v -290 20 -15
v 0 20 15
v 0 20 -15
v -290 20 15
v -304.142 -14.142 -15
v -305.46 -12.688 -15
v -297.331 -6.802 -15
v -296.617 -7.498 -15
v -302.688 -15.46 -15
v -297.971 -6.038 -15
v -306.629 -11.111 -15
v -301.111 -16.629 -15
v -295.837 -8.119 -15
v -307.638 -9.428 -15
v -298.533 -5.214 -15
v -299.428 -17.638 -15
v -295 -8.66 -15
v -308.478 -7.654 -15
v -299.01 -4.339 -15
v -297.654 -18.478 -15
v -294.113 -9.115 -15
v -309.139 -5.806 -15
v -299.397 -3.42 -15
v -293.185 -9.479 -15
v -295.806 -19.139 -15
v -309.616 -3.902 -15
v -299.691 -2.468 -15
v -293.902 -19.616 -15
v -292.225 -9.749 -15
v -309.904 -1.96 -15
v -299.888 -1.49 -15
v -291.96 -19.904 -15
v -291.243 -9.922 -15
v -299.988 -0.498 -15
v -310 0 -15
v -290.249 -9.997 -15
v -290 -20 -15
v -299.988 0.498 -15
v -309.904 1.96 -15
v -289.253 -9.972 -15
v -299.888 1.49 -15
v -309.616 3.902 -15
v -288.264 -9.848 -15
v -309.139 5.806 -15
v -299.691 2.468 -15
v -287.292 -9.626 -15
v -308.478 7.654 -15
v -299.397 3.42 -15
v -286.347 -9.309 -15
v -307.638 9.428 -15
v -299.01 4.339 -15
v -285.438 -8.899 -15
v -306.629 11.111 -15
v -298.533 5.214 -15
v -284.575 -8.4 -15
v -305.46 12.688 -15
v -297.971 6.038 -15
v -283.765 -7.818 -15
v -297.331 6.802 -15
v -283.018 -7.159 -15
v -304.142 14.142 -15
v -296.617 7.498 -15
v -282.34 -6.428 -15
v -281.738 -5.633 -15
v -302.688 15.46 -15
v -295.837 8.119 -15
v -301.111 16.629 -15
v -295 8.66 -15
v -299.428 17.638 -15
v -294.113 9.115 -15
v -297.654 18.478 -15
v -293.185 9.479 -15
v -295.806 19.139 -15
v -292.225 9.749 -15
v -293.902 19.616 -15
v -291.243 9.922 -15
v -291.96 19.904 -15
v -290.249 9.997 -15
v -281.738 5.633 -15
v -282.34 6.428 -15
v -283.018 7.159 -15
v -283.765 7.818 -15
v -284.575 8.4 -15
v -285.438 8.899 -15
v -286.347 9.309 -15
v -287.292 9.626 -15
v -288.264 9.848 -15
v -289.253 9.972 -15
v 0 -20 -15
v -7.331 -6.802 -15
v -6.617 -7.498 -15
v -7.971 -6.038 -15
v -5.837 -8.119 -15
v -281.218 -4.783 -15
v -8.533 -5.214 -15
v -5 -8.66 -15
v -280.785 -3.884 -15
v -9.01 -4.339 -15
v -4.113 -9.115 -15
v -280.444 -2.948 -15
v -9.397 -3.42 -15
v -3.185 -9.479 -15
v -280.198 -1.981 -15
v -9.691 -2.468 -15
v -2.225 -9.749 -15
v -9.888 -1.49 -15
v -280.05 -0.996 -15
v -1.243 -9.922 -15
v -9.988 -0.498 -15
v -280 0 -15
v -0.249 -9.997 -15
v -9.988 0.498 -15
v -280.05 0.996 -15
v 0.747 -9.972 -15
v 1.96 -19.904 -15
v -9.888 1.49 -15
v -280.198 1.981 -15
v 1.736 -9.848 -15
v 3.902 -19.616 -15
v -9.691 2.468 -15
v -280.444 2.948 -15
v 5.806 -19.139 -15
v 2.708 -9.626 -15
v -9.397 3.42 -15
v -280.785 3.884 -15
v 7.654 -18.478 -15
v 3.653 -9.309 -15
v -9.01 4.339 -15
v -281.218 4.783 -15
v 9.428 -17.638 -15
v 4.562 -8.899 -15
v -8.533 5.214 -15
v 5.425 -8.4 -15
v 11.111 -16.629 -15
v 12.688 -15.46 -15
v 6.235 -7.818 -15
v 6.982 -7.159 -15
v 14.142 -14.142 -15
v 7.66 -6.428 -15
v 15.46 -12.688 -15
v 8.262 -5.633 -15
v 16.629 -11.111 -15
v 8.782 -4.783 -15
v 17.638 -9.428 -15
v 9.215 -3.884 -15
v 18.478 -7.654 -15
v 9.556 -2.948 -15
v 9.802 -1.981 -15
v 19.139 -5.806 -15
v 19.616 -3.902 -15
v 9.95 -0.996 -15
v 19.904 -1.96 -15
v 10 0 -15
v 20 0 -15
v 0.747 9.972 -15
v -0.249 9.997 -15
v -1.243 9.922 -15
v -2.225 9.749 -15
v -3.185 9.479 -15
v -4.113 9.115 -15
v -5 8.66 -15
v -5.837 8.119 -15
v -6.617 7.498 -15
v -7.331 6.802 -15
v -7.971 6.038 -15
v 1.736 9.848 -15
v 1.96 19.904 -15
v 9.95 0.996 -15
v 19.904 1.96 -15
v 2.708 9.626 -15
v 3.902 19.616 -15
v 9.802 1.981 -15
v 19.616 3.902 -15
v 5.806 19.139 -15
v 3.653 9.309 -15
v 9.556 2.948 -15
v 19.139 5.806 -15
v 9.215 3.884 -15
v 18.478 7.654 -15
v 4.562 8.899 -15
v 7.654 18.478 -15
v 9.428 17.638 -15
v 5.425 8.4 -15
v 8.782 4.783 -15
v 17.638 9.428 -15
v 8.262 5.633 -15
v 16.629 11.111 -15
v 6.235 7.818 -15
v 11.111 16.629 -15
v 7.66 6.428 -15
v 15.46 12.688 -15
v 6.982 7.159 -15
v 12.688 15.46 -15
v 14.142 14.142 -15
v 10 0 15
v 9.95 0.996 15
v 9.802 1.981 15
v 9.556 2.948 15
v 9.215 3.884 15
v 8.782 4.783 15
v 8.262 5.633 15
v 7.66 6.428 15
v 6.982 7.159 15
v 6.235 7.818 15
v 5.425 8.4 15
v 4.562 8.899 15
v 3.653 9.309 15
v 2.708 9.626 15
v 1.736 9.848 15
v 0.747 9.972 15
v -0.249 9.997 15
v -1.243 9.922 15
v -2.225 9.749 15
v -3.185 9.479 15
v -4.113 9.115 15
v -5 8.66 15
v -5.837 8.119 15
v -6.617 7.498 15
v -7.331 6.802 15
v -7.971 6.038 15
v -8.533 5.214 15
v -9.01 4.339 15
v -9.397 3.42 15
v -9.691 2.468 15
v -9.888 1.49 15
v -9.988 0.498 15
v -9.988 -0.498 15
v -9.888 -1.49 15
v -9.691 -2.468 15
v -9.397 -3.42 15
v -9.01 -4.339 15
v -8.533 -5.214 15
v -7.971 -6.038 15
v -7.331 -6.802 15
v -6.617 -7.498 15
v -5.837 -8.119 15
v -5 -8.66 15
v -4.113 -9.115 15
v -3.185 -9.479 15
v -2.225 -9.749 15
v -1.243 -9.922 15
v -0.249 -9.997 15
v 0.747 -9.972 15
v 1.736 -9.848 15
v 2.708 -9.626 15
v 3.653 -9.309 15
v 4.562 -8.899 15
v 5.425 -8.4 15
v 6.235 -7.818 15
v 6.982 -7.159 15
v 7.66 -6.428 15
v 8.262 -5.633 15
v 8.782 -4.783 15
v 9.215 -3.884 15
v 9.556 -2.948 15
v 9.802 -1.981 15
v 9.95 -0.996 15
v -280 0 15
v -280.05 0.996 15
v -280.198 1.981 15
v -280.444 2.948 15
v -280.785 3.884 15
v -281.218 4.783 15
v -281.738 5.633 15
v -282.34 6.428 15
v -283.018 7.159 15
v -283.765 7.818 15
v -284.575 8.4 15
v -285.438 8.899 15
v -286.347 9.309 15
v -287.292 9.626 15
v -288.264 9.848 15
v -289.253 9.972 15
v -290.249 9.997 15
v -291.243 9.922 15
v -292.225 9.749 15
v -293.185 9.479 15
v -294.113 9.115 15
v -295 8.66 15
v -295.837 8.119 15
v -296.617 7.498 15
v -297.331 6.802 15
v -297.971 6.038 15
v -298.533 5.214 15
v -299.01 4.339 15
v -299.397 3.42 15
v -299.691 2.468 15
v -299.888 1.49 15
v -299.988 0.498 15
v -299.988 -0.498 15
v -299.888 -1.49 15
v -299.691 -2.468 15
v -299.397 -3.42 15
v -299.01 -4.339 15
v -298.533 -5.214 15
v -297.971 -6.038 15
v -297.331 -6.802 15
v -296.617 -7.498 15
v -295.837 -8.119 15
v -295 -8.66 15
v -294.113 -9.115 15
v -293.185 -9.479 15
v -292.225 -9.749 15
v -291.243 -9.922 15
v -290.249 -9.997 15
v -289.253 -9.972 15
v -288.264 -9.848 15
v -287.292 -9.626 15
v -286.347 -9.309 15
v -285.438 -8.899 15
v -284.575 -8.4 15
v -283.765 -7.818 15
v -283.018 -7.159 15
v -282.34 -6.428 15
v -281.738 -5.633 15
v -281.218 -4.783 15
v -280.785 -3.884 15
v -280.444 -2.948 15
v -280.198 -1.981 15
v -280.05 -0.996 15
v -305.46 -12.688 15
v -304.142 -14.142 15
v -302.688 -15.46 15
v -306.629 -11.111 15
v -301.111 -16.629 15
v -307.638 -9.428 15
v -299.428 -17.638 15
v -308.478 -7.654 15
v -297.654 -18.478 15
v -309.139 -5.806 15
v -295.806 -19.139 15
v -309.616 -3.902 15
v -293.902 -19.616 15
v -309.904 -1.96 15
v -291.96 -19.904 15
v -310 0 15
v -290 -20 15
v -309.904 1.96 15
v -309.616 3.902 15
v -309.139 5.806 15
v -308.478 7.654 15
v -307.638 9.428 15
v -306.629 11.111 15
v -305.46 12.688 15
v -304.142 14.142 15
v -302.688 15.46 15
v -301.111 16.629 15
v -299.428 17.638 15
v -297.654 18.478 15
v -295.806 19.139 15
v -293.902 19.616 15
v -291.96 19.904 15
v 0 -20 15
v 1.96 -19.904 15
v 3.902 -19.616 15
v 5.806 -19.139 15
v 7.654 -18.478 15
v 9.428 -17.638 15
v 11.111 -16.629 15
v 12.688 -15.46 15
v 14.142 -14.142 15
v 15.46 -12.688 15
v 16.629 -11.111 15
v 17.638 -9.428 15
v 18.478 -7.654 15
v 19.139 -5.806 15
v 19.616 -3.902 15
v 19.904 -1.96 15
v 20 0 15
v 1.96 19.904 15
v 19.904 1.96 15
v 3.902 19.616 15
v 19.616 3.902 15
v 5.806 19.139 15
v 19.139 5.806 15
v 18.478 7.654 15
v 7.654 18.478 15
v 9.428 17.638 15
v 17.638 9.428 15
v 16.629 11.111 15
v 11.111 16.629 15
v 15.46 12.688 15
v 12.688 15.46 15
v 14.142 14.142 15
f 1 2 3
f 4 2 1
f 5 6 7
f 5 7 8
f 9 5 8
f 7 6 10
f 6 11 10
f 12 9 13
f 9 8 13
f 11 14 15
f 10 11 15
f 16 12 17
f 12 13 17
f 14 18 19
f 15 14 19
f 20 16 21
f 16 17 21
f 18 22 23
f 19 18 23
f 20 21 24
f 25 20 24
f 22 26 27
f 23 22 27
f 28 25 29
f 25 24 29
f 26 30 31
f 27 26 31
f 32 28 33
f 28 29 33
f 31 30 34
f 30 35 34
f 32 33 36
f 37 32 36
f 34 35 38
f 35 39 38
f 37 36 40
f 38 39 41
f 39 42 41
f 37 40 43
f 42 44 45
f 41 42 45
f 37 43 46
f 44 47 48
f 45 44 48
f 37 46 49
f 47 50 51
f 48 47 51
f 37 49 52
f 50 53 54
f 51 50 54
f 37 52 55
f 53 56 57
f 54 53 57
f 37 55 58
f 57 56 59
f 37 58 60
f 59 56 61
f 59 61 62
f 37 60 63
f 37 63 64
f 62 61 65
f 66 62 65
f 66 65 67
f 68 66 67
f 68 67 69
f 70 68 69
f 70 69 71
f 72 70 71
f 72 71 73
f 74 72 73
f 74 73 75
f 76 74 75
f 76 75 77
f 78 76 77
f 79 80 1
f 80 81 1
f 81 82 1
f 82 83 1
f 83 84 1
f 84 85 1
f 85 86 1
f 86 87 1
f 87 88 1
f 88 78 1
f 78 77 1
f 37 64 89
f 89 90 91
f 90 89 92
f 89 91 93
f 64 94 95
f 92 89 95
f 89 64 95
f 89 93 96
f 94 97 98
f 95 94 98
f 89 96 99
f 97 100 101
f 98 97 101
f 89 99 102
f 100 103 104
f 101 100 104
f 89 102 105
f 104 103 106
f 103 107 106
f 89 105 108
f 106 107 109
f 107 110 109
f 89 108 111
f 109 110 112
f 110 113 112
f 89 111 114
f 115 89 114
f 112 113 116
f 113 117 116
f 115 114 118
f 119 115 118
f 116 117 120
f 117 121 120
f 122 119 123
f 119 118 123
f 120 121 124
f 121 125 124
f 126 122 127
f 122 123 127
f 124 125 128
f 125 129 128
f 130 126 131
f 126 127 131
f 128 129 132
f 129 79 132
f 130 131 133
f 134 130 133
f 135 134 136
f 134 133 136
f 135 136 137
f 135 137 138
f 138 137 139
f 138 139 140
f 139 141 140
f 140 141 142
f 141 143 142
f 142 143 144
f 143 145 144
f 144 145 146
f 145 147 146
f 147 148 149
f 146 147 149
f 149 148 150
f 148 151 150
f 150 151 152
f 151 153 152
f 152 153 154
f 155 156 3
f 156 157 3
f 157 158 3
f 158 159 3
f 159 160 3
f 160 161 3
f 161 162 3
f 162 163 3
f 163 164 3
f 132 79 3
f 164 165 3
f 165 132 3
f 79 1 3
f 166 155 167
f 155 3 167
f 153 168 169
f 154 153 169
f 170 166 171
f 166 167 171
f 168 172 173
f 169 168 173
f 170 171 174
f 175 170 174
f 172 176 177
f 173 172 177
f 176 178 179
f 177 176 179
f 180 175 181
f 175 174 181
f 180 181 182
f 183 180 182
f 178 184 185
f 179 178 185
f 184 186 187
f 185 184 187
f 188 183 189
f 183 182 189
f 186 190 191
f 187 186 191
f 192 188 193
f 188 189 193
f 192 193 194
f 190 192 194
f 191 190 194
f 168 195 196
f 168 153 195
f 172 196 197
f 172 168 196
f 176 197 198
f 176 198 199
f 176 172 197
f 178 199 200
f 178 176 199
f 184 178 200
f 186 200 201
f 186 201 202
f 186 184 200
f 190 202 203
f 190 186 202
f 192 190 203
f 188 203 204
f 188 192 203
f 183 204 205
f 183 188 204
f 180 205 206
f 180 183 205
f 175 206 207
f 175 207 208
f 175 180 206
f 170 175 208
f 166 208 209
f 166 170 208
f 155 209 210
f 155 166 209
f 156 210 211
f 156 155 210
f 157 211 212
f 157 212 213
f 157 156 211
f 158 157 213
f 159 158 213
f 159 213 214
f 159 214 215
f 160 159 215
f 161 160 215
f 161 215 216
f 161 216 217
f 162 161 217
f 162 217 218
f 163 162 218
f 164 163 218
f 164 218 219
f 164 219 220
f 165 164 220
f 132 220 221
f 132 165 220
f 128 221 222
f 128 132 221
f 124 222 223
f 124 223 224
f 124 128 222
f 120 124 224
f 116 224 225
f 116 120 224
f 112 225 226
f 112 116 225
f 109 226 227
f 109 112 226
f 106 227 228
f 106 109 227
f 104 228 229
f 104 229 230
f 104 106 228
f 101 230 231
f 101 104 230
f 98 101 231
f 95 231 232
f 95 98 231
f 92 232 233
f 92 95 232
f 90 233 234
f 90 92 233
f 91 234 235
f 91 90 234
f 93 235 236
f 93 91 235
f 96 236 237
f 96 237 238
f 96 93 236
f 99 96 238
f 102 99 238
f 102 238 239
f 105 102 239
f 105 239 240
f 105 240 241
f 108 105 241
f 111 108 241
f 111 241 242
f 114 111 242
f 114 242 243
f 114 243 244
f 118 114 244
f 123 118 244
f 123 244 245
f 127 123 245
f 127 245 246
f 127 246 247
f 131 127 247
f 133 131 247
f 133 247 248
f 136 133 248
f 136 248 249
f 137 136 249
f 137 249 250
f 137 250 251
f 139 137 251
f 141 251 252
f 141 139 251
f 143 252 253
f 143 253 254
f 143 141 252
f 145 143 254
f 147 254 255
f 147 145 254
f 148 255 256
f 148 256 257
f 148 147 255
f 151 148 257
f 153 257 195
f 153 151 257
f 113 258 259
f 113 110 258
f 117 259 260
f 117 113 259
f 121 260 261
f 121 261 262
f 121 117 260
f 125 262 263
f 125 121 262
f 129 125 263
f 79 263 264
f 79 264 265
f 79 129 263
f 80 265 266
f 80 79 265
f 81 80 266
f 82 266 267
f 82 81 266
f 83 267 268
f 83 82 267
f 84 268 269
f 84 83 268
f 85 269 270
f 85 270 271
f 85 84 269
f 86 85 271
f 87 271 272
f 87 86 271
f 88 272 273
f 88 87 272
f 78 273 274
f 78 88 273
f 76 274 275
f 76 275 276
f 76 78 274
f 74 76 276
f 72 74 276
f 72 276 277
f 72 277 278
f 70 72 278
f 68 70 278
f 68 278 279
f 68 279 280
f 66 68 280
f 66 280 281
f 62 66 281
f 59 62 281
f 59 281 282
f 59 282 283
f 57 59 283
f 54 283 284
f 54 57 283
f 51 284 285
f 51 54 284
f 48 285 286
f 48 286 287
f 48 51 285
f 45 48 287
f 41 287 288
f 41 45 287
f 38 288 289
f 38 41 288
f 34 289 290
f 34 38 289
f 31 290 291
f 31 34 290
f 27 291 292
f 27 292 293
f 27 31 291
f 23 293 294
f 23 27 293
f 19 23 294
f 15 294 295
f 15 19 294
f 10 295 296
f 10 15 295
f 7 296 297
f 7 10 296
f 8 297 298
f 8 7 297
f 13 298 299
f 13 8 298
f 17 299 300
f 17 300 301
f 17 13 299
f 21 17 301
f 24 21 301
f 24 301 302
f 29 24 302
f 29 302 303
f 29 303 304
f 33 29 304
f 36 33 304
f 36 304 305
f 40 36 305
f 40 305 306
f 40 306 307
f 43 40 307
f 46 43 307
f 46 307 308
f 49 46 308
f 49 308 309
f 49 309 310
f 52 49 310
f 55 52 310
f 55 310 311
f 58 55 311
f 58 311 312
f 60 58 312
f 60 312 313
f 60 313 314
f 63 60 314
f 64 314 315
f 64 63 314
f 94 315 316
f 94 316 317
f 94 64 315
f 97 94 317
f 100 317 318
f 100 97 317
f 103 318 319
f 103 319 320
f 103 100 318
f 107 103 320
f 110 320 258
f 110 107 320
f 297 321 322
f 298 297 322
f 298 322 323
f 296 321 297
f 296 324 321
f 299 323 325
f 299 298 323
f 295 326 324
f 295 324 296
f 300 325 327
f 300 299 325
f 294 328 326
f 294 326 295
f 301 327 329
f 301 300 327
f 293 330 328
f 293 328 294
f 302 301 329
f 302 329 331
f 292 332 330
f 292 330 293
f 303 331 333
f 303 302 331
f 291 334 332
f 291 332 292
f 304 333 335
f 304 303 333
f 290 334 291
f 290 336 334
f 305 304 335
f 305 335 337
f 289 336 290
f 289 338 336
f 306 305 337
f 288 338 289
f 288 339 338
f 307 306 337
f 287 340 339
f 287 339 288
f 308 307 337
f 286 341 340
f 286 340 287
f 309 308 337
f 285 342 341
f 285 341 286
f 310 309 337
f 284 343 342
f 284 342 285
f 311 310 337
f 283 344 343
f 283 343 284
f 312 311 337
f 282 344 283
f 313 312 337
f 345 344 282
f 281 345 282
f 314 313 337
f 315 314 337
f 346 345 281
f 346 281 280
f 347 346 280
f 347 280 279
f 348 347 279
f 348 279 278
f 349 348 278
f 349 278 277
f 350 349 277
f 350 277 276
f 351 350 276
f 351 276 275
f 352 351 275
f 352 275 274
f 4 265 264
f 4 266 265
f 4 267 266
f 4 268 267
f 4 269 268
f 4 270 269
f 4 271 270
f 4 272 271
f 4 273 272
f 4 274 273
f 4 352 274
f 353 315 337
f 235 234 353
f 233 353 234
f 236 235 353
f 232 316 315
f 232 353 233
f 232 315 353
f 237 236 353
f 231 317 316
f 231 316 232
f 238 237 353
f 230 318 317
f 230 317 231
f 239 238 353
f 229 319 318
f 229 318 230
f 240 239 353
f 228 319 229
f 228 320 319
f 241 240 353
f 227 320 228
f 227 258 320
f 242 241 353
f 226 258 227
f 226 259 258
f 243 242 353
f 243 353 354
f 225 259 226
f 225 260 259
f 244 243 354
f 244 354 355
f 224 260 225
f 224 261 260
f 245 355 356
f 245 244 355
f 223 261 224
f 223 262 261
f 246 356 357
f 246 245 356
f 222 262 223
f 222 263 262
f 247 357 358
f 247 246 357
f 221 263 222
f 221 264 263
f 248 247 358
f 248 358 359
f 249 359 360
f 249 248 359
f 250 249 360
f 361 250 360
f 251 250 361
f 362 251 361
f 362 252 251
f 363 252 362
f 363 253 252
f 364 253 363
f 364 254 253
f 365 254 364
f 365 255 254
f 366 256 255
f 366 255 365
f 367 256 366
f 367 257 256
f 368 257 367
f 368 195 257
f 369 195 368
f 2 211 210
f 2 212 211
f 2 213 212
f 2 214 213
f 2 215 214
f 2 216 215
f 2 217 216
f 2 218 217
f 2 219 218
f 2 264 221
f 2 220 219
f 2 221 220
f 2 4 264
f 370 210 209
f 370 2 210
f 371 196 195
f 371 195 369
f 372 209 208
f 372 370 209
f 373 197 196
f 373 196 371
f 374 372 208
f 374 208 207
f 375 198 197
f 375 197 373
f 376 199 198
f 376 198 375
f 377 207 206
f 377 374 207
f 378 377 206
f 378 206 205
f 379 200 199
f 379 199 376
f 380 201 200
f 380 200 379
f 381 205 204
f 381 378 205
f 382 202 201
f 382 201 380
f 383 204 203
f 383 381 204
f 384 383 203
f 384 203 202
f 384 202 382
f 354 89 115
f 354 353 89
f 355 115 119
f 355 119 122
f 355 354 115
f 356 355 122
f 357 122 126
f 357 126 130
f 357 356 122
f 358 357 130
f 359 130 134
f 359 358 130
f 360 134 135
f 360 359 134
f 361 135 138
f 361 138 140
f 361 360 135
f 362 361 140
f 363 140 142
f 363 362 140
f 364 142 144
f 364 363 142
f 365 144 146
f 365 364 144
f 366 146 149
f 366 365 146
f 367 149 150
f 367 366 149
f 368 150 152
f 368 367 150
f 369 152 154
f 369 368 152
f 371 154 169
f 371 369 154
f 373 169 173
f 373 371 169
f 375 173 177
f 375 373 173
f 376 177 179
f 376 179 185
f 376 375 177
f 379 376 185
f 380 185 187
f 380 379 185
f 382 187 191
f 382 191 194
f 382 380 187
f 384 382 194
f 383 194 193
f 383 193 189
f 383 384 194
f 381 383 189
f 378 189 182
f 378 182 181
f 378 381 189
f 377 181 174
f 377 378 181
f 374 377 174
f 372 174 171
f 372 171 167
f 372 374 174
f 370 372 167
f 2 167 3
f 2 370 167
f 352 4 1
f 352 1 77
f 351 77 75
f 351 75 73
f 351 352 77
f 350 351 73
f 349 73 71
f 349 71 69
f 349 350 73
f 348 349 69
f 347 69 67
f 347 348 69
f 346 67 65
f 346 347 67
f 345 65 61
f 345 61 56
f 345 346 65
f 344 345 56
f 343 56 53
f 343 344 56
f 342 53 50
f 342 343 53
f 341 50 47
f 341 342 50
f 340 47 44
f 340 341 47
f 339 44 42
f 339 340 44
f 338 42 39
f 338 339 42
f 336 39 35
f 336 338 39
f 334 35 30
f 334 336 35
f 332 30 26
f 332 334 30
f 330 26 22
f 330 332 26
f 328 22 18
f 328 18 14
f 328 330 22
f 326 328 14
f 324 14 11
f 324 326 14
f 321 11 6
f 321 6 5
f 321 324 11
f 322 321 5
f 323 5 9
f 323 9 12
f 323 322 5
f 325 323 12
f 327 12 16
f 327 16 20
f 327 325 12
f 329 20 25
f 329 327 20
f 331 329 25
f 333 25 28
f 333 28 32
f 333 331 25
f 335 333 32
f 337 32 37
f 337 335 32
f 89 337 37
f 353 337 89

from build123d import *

# Parameters (mm, degrees)
SKETCH_1_R      = 10
EXTRUDE_1_DEPTH = 15


with BuildPart() as part:
    # Эскиз1 → Бобышка-Вытянуть1 (new body, symmetric)
    with BuildSketch(Plane.XY):
        with BuildLine():
            Line((0, 20), (-290, 20))
            ThreePointArc((-290, 20), (-310, 0), (-290, -20))
            Line((-290, -20), (0, -20))
            ThreePointArc((0, -20), (20, 0), (0, 20))
        make_face()
        with Locations((-290, 0)):
            Circle(SKETCH_1_R, mode=Mode.SUBTRACT)
        Circle(SKETCH_1_R, mode=Mode.SUBTRACT)
    extrude(amount=EXTRUDE_1_DEPTH, both=True)


solid = part.part
